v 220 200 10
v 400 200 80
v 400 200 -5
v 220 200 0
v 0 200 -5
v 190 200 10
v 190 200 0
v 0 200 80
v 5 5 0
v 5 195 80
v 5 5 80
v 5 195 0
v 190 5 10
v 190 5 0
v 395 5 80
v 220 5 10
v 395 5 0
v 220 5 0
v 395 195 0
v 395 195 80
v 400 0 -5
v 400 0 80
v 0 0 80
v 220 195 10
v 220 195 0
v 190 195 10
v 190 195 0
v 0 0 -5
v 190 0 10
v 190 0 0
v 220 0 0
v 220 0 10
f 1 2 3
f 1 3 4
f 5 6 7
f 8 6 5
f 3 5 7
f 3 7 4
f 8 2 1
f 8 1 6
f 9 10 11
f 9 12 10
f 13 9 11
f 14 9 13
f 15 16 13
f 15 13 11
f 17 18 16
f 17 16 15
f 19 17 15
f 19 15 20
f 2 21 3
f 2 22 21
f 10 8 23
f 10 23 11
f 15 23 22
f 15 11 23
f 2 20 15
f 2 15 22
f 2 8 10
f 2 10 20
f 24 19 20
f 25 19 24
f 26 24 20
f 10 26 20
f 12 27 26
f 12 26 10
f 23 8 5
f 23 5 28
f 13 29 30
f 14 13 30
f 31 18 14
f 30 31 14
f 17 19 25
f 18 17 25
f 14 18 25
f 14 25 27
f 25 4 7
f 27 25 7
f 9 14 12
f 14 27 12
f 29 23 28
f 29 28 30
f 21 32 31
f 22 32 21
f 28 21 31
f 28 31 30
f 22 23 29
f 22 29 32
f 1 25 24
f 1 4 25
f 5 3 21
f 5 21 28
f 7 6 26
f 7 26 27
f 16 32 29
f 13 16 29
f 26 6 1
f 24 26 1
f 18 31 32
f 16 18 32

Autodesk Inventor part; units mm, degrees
ref_plane "YZ Plane" through (0, 0, 0) normal (1, 0, 0) x (0, 1, 0)
ref_plane "XZ Plane" through (0, 0, 0) normal (0, 1, 0) x (-1, 0, 0)
ref_plane "XY Plane" through (0, 0, 0) normal (0, 0, 1) x (1, 0, 0)
sketch "Sketch1" plane through (0, 0, 0) normal (0, 0, 1) x (1, 0, 0)
  line L0 (0, 0) -> (400, 0)
  line L1 (400, 0) -> (400, 200)
  line L2 (400, 200) -> (0, 200)
  line L3 (0, 200) -> (0, 0)
  line L4 (5, 5) -> (395, 5)
  line L5 (395, 5) -> (395, 195)
  line L6 (395, 195) -> (5, 195)
  line L7 (5, 195) -> (5, 5)
  dimension "d0" = 400
  dimension "d1" = 200
  dimension "d2" = 390
  dimension "d3" = 190
extrude "Extrusion1" add sketch "Sketch1" along normal blind 80
sketch "Sketch2" plane through (0, 0, 0) normal (0, -1, 0) x (1, 0, 0)
  line L0 (5, 0) -> (395, 0) projected
  line L1 (190, 0) -> (220, 0)
  line L2 (220, 0) -> (220, 10)
  line L3 (220, 10) -> (190, 10)
  line L4 (190, 10) -> (190, 0)
  point P0 (0, 0)
  dimension "d6" = 30
  dimension "d7" = 10
extrude "Extrusion2" cut sketch "Sketch2" against normal blind 80
sketch "Sketch3" plane through (0, 200, 0) normal (0, 1, 0) x (1, 0, 0)
  line L0 (190, -10) -> (220, -10) projected
  line L1 (190, 0) -> (5, 0) projected
  line L2 (220, -10) -> (190, -10)
  line L3 (190, -10) -> (190, 0)
  line L4 (190, 0) -> (220, 0)
  line L5 (220, 0) -> (220, -10)
  point P0 (0, 0)
extrude "Extrusion3" cut sketch "Sketch3" against normal blind 80
sketch "Sketch4" plane through (0, 0, 0) normal (0, 0, -1) x (-1, 0, 0)
  line L0 (-400, 200) -> (-220, 200) projected
  line L1 (0, 0) -> (-400, 0)
  line L2 (-400, 0) -> (-400, 200)
  line L3 (-400, 200) -> (0, 200)
  line L4 (0, 200) -> (0, 0)
extrude "Extrusion4" add sketch "Sketch4" along normal blind 5
sketch "Sketch5" plane through (0, 0, 80) normal (0, 0, 1) x (1, 0, 0)
  point P0 (0, 0)
properties part number "d"
